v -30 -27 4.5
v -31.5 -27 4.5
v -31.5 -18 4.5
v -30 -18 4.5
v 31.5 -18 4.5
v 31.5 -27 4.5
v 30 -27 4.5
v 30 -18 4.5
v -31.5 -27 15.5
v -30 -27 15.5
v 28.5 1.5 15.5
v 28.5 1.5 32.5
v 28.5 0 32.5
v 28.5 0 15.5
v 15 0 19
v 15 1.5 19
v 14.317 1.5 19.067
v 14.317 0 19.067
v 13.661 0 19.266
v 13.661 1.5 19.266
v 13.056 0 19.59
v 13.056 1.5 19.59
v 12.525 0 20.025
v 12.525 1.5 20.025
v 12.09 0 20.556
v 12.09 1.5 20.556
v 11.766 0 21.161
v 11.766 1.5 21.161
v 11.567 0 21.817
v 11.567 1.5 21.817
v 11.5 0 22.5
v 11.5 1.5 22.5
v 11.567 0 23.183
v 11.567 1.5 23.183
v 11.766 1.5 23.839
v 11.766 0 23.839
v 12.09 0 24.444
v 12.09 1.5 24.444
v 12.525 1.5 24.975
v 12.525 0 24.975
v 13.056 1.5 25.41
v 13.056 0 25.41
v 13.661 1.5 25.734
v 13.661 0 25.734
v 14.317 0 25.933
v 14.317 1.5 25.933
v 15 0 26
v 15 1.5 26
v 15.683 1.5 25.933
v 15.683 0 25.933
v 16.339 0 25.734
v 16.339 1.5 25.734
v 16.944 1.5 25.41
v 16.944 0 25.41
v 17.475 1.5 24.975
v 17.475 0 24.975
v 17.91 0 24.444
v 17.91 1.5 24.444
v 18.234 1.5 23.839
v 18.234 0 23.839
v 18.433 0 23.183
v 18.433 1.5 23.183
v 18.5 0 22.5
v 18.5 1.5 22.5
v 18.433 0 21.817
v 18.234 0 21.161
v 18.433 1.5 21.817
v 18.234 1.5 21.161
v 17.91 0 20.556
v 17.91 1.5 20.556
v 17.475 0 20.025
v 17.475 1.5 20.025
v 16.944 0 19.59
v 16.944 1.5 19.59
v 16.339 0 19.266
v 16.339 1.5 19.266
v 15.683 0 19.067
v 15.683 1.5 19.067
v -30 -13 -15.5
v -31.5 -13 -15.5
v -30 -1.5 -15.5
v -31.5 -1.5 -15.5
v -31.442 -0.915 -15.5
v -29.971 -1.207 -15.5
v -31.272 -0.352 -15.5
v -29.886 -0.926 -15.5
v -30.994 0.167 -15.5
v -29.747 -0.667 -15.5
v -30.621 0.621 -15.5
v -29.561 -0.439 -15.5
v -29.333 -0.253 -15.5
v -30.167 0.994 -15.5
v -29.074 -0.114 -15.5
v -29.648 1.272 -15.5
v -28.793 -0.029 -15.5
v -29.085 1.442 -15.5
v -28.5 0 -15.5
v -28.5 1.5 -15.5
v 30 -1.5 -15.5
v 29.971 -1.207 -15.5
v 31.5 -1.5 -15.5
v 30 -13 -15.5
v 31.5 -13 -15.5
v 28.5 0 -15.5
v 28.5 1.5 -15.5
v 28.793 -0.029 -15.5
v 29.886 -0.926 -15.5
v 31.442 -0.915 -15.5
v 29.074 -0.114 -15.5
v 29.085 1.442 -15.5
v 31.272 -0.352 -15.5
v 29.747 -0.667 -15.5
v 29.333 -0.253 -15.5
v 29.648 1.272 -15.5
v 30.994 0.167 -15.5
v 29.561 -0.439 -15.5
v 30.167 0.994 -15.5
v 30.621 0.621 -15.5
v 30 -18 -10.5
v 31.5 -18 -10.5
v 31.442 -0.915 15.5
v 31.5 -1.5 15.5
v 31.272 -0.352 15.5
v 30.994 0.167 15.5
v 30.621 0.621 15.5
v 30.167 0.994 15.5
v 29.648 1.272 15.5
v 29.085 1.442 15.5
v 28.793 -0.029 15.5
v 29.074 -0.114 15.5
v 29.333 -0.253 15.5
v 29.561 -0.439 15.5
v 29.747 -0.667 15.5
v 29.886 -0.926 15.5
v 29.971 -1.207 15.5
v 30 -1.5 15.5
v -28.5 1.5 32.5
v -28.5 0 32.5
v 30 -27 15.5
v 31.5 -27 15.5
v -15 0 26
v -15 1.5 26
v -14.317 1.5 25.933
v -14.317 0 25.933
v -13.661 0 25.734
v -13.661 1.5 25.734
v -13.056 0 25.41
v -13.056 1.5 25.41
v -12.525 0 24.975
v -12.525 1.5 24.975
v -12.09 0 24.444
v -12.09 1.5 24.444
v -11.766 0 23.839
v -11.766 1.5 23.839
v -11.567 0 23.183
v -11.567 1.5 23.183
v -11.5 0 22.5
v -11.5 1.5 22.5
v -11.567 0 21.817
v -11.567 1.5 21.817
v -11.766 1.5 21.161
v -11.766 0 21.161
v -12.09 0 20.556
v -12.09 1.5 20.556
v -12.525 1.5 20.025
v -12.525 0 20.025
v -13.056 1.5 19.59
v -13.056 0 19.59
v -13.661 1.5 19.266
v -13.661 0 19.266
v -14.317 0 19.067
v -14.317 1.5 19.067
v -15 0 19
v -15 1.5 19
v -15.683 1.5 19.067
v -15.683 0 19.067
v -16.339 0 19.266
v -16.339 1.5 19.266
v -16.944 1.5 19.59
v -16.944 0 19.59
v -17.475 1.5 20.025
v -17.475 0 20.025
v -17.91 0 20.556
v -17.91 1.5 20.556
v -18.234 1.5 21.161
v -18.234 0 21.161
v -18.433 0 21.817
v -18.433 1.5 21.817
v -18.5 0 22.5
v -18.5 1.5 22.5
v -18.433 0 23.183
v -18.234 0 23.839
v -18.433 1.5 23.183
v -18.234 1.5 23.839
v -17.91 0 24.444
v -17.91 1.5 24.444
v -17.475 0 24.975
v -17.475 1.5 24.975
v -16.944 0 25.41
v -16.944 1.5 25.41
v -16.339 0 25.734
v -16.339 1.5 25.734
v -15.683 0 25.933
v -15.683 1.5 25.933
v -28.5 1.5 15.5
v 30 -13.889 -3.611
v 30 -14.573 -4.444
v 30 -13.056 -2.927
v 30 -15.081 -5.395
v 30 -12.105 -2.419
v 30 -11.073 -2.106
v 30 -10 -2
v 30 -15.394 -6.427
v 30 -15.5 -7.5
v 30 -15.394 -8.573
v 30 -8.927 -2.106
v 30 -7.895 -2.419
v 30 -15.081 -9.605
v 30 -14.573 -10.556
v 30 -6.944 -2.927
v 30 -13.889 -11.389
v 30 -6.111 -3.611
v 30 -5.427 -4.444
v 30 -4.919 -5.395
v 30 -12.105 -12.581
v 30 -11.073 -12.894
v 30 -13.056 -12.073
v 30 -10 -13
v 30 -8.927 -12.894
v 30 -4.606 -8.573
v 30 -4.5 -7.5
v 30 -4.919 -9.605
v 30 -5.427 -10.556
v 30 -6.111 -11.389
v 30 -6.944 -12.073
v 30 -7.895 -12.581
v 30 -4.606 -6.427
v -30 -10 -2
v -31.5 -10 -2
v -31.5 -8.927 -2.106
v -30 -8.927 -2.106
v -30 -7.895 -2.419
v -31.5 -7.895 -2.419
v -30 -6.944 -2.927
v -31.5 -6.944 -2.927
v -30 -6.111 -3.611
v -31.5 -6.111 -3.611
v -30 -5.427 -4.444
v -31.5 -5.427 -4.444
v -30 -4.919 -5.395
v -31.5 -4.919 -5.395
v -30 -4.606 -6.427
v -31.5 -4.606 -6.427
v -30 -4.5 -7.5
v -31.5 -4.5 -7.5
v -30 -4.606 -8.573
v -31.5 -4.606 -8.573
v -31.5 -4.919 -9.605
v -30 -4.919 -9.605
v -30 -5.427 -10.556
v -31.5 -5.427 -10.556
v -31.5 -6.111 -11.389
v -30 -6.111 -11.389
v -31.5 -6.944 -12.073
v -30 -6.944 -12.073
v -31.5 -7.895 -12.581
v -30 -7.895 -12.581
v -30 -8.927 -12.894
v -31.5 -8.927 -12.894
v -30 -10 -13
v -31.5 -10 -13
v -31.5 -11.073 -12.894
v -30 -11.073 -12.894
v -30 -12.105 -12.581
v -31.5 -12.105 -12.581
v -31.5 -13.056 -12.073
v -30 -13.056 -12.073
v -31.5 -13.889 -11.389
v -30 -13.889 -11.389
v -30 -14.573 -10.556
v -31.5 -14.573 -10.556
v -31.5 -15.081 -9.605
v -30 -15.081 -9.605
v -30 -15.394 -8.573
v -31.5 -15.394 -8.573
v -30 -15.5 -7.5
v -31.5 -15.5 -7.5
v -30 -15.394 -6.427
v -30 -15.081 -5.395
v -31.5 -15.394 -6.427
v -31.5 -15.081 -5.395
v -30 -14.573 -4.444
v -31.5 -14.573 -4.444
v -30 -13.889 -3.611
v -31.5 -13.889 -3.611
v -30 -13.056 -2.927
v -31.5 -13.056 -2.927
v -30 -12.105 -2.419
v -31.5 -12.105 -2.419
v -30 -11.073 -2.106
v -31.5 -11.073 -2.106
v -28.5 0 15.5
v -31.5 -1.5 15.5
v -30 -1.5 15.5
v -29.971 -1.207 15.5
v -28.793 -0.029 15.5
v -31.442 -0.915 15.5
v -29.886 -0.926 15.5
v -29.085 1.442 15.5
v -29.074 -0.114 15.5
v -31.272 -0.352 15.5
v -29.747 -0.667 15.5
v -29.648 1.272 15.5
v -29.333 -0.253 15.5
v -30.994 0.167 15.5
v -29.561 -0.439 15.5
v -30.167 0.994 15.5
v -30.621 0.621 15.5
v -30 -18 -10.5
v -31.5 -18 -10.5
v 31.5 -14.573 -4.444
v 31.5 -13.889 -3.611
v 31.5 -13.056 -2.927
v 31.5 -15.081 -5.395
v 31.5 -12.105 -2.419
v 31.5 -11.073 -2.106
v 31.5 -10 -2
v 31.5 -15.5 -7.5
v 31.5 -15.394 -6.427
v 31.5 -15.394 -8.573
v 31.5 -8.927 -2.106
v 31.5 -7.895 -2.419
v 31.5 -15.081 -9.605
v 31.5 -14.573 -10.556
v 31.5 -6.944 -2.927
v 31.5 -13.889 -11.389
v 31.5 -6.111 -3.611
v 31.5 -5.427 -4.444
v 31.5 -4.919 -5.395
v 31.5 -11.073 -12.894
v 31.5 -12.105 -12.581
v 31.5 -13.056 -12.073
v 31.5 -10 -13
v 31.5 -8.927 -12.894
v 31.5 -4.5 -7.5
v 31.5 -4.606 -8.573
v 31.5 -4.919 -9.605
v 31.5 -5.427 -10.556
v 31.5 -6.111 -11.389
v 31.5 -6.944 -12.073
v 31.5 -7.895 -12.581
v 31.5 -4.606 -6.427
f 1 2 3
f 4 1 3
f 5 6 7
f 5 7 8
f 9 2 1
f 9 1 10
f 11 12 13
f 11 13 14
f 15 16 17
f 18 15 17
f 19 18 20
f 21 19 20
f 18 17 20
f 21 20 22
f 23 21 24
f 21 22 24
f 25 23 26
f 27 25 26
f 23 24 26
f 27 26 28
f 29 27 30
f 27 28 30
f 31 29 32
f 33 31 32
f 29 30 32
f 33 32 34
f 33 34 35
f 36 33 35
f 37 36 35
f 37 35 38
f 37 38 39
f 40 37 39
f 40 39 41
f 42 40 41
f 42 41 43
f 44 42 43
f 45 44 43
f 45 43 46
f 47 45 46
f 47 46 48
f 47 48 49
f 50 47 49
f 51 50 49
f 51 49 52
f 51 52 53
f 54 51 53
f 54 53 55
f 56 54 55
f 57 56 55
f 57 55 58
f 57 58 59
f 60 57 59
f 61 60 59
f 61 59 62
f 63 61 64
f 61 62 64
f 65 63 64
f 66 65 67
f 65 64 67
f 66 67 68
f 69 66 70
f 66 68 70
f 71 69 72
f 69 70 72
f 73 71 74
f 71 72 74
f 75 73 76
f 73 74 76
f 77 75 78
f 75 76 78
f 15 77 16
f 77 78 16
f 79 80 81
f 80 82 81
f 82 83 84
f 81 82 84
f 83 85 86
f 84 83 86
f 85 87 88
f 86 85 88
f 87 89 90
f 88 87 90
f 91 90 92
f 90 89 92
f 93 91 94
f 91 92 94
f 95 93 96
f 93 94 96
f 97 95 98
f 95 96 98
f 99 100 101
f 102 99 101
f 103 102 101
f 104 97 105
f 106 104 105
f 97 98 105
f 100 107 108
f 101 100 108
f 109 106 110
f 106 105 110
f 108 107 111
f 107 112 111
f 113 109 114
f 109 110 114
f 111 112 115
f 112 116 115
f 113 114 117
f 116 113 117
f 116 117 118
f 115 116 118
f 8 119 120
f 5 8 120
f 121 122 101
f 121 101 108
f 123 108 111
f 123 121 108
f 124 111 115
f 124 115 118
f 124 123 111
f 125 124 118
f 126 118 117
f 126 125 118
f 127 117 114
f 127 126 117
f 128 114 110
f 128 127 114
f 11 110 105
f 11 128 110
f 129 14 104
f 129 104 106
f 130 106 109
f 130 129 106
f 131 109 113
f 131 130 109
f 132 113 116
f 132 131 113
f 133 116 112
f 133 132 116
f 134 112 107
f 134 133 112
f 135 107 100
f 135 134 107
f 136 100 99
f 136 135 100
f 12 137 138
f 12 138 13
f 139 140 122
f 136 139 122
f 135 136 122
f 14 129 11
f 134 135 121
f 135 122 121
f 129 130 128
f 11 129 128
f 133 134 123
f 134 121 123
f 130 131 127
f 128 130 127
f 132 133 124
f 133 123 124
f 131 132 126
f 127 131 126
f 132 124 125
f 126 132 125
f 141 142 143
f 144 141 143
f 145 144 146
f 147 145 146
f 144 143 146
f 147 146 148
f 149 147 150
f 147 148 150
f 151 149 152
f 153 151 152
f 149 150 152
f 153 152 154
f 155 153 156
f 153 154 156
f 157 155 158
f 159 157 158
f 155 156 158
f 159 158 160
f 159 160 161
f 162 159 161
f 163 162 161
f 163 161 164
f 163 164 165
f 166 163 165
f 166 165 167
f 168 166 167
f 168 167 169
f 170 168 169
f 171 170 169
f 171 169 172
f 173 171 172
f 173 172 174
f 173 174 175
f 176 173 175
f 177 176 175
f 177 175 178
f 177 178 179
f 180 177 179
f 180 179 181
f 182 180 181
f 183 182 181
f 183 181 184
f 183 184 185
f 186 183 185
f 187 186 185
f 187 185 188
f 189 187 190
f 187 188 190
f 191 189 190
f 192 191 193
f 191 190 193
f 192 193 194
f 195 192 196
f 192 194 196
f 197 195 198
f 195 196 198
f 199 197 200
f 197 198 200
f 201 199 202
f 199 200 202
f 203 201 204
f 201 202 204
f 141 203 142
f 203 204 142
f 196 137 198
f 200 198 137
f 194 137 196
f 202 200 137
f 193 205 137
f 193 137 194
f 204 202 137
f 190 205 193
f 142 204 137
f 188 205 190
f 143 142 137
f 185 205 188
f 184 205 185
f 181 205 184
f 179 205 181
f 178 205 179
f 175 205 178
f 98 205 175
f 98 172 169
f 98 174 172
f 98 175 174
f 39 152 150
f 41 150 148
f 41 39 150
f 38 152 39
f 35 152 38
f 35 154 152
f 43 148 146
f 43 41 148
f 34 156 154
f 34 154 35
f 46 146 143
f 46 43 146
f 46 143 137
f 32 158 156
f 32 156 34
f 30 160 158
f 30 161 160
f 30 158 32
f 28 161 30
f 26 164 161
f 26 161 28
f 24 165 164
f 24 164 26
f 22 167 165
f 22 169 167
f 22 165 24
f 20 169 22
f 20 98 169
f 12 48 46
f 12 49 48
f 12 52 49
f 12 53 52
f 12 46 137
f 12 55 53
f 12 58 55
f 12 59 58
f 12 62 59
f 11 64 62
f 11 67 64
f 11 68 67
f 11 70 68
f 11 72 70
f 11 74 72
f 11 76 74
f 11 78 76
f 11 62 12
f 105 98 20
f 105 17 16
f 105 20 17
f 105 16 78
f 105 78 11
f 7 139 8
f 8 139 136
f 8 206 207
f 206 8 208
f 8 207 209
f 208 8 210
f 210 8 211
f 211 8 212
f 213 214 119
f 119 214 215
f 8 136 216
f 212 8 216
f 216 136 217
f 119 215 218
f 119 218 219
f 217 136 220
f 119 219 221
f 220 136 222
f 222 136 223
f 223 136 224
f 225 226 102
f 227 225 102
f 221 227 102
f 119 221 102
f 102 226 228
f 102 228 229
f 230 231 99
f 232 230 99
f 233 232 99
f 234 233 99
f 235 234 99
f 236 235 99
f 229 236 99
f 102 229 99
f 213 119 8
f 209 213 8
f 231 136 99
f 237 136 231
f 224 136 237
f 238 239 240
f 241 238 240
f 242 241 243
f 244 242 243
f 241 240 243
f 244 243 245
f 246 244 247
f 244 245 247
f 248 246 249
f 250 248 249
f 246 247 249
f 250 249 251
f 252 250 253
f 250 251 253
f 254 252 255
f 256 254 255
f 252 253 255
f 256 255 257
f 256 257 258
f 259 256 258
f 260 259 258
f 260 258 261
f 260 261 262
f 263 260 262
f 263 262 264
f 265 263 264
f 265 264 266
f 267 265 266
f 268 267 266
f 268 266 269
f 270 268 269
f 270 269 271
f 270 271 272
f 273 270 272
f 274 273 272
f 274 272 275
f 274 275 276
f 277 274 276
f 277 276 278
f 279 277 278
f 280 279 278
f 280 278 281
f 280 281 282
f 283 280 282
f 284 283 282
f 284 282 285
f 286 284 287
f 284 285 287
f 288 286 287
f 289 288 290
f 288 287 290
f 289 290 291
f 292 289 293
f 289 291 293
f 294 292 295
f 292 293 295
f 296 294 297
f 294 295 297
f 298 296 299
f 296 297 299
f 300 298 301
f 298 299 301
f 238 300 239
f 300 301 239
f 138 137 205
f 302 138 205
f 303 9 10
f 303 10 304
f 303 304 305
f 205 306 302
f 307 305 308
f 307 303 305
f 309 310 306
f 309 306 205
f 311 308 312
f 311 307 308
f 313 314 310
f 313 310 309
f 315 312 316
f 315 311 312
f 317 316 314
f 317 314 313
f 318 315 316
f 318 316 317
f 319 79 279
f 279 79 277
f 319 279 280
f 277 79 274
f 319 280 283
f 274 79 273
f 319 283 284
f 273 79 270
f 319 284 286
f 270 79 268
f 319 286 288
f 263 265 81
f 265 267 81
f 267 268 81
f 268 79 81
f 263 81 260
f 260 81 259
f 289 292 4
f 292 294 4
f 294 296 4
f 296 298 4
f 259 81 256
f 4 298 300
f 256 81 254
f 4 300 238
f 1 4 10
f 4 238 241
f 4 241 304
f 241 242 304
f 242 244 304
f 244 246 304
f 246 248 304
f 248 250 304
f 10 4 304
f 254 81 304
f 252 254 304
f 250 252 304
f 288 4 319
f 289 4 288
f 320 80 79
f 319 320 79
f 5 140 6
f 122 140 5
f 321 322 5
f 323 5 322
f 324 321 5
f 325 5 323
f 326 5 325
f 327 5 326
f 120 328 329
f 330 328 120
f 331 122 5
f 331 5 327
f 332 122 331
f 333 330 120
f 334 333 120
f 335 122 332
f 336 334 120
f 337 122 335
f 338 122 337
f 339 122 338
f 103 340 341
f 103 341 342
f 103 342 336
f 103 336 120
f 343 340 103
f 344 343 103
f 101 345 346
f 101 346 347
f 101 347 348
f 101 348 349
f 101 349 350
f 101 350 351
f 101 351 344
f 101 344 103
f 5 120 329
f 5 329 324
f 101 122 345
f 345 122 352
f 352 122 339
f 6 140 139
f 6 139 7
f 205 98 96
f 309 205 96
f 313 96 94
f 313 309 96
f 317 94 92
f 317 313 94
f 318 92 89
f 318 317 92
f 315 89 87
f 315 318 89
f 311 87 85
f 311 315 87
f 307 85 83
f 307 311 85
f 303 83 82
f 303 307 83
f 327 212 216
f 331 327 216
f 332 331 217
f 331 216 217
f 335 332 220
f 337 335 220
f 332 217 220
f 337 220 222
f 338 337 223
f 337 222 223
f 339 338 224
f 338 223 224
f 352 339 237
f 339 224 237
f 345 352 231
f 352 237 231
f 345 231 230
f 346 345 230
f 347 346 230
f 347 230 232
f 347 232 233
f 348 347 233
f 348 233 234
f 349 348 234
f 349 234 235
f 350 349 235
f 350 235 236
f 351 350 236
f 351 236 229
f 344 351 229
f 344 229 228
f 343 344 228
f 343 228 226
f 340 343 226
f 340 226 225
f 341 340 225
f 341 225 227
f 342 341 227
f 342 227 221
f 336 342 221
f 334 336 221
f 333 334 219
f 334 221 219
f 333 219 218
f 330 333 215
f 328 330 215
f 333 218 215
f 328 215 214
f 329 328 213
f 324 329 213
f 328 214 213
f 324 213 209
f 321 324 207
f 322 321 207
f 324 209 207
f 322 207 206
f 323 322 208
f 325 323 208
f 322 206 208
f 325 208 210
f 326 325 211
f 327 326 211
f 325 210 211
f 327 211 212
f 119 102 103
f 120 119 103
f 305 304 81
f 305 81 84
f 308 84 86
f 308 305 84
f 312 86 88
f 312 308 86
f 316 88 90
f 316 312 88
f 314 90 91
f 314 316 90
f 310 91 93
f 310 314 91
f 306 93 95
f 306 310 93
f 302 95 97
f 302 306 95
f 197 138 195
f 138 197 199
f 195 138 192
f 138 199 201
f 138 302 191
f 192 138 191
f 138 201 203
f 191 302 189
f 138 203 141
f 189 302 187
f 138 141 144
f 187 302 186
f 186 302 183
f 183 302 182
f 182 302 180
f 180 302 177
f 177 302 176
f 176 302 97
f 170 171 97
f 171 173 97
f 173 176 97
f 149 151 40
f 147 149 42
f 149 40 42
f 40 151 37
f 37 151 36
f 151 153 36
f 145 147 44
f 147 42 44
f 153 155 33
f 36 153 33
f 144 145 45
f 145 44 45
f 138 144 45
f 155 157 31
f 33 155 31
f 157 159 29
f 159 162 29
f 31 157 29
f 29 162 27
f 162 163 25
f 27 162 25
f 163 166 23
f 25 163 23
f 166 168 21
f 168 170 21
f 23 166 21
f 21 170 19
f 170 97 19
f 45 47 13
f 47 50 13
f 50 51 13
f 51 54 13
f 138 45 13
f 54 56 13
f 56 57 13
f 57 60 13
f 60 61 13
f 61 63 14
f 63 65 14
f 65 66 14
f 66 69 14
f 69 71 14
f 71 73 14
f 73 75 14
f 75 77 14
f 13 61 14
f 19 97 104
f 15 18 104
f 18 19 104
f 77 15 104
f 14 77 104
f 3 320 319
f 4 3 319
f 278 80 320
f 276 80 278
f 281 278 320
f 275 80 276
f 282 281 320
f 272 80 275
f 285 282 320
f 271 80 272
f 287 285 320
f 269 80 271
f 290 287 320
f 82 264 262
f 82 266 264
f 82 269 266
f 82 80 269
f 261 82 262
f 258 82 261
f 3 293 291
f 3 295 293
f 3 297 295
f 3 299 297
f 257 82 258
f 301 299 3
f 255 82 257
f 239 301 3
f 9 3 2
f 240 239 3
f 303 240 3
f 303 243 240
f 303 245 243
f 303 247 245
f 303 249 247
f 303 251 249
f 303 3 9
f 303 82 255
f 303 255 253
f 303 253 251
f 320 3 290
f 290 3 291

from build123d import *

# Parameters (mm, degrees)
SM_BASE_FLANGE_1_DEPTH   = 15.5
OTHER_START              = -23.68807717
OTHER_1_OUTLINE_W        = 1.5
OTHER_1_OUTLINE_H        = 10
OTHER_1_DEPTH            = 3.535533906
SKETCH_6_R               = 5.5
CUT_EXTRUDE_752_DEPTH    = 68.329414077
SKETCH_8_W               = 57
SKETCH_8_H               = 17
SM_BASE_FLANGE_1_2_DEPTH = 1.5
SKETCH_7_R               = 3.5
CUT_EXTRUDE_2_DEPTH      = 10
SKETCH_9_W               = 11
SKETCH_9_H               = 9
SM_BASE_FLANGE_2_DEPTH   = 1.5
SKETCH_12_W              = 11
SKETCH_12_H              = 9
SM_BASE_FLANGE_3_DEPTH   = 1.5


# Read off the part's stored shape, not the designer's step: Затупленный угол1
# Sheet-metal steps are written as plain solids
with BuildPart() as part:
    # Sketch 1 → Sm Base Flange 1 (new, symmetric)
    with BuildSketch(Plane.XY):
        with BuildLine():
            Line((-30, -18), (-30, -1.5))
            ThreePointArc((-30, -1.5), (-29.560660172, -0.439339828), (-28.5, 0))
            Line((-28.5, 0), (28.5, 0))
            ThreePointArc((28.5, 0), (29.560660172, -0.439339828), (30, -1.5))
            Line((30, -1.5), (30, -18))
            Line((30, -18), (31.5, -18))
            Line((31.5, -18), (31.5, -1.5))
            ThreePointArc((31.5, -1.5), (30.621320344, 0.621320344), (28.5, 1.5))
            Line((28.5, 1.5), (-28.5, 1.5))
            ThreePointArc((-28.5, 1.5), (-30.621320344, 0.621320344), (-31.5, -1.5))
            Line((-31.5, -1.5), (-31.5, -18))
            Line((-31.5, -18), (-30, -18))
        make_face()
    extrude(amount=SM_BASE_FLANGE_1_DEPTH, both=True)

    # Other 1 outline → Other 1 (cut)
    with BuildSketch(Plane(origin=(0, 0, 0), x_dir=(1, 0, 0), z_dir=(0, 0.7071067811865476, 0.7071067811865476)).offset(OTHER_START)):
        with Locations((-30.75, -2)):
            Rectangle(OTHER_1_OUTLINE_W, OTHER_1_OUTLINE_H)
        with Locations((30.75, -2)):
            Rectangle(OTHER_1_OUTLINE_W, OTHER_1_OUTLINE_H)
    extrude(amount=OTHER_1_DEPTH, mode=Mode.SUBTRACT)

    # Эскиз6 → Cut-Extrude 752 (cut, through all)
    with BuildSketch(Plane.ZY.offset(31.5)):
        with Locations((-7.5, -10)):
            Circle(SKETCH_6_R)
    extrude(amount=-CUT_EXTRUDE_752_DEPTH, mode=Mode.SUBTRACT)

    # Эскиз8 → Sm Base Flange 1 2 (add)
    with BuildSketch(Plane(origin=(0, 1.5, 0), x_dir=(1, 0, 0), z_dir=(0, 1, 0))):
        with Locations((0, -24)):
            Rectangle(SKETCH_8_W, SKETCH_8_H)
    extrude(amount=-SM_BASE_FLANGE_1_2_DEPTH)

    # Эскиз7 → Вырез-Вытянуть2 (cut)
    with BuildSketch(Plane(origin=(0, 1.5, 0), x_dir=(1, 0, 0), z_dir=(0, 1, 0))):
        with Locations(Location((-15, -22.5, 0), (0, 0, 270))):
            Circle(SKETCH_7_R)
        with Locations(Location((15, -22.5, 0), (0, 0, 90))):
            Circle(SKETCH_7_R)
    extrude(amount=-CUT_EXTRUDE_2_DEPTH, mode=Mode.SUBTRACT)

    # Эскиз9 → Выступ2 (add)
    with BuildSketch(Plane(origin=(31.5, 0, 0), x_dir=(0, 0, -1), z_dir=(1, 0, 0))):
        with Locations((-10, -22.5)):
            Rectangle(SKETCH_9_W, SKETCH_9_H)
    extrude(amount=-SM_BASE_FLANGE_2_DEPTH)

    # Эскиз12 → Выступ3 (add)
    with BuildSketch(Plane.ZY.offset(31.5)):
        with Locations((10, -22.5)):
            Rectangle(SKETCH_12_W, SKETCH_12_H)
    extrude(amount=-SM_BASE_FLANGE_3_DEPTH)


solid = part.part
